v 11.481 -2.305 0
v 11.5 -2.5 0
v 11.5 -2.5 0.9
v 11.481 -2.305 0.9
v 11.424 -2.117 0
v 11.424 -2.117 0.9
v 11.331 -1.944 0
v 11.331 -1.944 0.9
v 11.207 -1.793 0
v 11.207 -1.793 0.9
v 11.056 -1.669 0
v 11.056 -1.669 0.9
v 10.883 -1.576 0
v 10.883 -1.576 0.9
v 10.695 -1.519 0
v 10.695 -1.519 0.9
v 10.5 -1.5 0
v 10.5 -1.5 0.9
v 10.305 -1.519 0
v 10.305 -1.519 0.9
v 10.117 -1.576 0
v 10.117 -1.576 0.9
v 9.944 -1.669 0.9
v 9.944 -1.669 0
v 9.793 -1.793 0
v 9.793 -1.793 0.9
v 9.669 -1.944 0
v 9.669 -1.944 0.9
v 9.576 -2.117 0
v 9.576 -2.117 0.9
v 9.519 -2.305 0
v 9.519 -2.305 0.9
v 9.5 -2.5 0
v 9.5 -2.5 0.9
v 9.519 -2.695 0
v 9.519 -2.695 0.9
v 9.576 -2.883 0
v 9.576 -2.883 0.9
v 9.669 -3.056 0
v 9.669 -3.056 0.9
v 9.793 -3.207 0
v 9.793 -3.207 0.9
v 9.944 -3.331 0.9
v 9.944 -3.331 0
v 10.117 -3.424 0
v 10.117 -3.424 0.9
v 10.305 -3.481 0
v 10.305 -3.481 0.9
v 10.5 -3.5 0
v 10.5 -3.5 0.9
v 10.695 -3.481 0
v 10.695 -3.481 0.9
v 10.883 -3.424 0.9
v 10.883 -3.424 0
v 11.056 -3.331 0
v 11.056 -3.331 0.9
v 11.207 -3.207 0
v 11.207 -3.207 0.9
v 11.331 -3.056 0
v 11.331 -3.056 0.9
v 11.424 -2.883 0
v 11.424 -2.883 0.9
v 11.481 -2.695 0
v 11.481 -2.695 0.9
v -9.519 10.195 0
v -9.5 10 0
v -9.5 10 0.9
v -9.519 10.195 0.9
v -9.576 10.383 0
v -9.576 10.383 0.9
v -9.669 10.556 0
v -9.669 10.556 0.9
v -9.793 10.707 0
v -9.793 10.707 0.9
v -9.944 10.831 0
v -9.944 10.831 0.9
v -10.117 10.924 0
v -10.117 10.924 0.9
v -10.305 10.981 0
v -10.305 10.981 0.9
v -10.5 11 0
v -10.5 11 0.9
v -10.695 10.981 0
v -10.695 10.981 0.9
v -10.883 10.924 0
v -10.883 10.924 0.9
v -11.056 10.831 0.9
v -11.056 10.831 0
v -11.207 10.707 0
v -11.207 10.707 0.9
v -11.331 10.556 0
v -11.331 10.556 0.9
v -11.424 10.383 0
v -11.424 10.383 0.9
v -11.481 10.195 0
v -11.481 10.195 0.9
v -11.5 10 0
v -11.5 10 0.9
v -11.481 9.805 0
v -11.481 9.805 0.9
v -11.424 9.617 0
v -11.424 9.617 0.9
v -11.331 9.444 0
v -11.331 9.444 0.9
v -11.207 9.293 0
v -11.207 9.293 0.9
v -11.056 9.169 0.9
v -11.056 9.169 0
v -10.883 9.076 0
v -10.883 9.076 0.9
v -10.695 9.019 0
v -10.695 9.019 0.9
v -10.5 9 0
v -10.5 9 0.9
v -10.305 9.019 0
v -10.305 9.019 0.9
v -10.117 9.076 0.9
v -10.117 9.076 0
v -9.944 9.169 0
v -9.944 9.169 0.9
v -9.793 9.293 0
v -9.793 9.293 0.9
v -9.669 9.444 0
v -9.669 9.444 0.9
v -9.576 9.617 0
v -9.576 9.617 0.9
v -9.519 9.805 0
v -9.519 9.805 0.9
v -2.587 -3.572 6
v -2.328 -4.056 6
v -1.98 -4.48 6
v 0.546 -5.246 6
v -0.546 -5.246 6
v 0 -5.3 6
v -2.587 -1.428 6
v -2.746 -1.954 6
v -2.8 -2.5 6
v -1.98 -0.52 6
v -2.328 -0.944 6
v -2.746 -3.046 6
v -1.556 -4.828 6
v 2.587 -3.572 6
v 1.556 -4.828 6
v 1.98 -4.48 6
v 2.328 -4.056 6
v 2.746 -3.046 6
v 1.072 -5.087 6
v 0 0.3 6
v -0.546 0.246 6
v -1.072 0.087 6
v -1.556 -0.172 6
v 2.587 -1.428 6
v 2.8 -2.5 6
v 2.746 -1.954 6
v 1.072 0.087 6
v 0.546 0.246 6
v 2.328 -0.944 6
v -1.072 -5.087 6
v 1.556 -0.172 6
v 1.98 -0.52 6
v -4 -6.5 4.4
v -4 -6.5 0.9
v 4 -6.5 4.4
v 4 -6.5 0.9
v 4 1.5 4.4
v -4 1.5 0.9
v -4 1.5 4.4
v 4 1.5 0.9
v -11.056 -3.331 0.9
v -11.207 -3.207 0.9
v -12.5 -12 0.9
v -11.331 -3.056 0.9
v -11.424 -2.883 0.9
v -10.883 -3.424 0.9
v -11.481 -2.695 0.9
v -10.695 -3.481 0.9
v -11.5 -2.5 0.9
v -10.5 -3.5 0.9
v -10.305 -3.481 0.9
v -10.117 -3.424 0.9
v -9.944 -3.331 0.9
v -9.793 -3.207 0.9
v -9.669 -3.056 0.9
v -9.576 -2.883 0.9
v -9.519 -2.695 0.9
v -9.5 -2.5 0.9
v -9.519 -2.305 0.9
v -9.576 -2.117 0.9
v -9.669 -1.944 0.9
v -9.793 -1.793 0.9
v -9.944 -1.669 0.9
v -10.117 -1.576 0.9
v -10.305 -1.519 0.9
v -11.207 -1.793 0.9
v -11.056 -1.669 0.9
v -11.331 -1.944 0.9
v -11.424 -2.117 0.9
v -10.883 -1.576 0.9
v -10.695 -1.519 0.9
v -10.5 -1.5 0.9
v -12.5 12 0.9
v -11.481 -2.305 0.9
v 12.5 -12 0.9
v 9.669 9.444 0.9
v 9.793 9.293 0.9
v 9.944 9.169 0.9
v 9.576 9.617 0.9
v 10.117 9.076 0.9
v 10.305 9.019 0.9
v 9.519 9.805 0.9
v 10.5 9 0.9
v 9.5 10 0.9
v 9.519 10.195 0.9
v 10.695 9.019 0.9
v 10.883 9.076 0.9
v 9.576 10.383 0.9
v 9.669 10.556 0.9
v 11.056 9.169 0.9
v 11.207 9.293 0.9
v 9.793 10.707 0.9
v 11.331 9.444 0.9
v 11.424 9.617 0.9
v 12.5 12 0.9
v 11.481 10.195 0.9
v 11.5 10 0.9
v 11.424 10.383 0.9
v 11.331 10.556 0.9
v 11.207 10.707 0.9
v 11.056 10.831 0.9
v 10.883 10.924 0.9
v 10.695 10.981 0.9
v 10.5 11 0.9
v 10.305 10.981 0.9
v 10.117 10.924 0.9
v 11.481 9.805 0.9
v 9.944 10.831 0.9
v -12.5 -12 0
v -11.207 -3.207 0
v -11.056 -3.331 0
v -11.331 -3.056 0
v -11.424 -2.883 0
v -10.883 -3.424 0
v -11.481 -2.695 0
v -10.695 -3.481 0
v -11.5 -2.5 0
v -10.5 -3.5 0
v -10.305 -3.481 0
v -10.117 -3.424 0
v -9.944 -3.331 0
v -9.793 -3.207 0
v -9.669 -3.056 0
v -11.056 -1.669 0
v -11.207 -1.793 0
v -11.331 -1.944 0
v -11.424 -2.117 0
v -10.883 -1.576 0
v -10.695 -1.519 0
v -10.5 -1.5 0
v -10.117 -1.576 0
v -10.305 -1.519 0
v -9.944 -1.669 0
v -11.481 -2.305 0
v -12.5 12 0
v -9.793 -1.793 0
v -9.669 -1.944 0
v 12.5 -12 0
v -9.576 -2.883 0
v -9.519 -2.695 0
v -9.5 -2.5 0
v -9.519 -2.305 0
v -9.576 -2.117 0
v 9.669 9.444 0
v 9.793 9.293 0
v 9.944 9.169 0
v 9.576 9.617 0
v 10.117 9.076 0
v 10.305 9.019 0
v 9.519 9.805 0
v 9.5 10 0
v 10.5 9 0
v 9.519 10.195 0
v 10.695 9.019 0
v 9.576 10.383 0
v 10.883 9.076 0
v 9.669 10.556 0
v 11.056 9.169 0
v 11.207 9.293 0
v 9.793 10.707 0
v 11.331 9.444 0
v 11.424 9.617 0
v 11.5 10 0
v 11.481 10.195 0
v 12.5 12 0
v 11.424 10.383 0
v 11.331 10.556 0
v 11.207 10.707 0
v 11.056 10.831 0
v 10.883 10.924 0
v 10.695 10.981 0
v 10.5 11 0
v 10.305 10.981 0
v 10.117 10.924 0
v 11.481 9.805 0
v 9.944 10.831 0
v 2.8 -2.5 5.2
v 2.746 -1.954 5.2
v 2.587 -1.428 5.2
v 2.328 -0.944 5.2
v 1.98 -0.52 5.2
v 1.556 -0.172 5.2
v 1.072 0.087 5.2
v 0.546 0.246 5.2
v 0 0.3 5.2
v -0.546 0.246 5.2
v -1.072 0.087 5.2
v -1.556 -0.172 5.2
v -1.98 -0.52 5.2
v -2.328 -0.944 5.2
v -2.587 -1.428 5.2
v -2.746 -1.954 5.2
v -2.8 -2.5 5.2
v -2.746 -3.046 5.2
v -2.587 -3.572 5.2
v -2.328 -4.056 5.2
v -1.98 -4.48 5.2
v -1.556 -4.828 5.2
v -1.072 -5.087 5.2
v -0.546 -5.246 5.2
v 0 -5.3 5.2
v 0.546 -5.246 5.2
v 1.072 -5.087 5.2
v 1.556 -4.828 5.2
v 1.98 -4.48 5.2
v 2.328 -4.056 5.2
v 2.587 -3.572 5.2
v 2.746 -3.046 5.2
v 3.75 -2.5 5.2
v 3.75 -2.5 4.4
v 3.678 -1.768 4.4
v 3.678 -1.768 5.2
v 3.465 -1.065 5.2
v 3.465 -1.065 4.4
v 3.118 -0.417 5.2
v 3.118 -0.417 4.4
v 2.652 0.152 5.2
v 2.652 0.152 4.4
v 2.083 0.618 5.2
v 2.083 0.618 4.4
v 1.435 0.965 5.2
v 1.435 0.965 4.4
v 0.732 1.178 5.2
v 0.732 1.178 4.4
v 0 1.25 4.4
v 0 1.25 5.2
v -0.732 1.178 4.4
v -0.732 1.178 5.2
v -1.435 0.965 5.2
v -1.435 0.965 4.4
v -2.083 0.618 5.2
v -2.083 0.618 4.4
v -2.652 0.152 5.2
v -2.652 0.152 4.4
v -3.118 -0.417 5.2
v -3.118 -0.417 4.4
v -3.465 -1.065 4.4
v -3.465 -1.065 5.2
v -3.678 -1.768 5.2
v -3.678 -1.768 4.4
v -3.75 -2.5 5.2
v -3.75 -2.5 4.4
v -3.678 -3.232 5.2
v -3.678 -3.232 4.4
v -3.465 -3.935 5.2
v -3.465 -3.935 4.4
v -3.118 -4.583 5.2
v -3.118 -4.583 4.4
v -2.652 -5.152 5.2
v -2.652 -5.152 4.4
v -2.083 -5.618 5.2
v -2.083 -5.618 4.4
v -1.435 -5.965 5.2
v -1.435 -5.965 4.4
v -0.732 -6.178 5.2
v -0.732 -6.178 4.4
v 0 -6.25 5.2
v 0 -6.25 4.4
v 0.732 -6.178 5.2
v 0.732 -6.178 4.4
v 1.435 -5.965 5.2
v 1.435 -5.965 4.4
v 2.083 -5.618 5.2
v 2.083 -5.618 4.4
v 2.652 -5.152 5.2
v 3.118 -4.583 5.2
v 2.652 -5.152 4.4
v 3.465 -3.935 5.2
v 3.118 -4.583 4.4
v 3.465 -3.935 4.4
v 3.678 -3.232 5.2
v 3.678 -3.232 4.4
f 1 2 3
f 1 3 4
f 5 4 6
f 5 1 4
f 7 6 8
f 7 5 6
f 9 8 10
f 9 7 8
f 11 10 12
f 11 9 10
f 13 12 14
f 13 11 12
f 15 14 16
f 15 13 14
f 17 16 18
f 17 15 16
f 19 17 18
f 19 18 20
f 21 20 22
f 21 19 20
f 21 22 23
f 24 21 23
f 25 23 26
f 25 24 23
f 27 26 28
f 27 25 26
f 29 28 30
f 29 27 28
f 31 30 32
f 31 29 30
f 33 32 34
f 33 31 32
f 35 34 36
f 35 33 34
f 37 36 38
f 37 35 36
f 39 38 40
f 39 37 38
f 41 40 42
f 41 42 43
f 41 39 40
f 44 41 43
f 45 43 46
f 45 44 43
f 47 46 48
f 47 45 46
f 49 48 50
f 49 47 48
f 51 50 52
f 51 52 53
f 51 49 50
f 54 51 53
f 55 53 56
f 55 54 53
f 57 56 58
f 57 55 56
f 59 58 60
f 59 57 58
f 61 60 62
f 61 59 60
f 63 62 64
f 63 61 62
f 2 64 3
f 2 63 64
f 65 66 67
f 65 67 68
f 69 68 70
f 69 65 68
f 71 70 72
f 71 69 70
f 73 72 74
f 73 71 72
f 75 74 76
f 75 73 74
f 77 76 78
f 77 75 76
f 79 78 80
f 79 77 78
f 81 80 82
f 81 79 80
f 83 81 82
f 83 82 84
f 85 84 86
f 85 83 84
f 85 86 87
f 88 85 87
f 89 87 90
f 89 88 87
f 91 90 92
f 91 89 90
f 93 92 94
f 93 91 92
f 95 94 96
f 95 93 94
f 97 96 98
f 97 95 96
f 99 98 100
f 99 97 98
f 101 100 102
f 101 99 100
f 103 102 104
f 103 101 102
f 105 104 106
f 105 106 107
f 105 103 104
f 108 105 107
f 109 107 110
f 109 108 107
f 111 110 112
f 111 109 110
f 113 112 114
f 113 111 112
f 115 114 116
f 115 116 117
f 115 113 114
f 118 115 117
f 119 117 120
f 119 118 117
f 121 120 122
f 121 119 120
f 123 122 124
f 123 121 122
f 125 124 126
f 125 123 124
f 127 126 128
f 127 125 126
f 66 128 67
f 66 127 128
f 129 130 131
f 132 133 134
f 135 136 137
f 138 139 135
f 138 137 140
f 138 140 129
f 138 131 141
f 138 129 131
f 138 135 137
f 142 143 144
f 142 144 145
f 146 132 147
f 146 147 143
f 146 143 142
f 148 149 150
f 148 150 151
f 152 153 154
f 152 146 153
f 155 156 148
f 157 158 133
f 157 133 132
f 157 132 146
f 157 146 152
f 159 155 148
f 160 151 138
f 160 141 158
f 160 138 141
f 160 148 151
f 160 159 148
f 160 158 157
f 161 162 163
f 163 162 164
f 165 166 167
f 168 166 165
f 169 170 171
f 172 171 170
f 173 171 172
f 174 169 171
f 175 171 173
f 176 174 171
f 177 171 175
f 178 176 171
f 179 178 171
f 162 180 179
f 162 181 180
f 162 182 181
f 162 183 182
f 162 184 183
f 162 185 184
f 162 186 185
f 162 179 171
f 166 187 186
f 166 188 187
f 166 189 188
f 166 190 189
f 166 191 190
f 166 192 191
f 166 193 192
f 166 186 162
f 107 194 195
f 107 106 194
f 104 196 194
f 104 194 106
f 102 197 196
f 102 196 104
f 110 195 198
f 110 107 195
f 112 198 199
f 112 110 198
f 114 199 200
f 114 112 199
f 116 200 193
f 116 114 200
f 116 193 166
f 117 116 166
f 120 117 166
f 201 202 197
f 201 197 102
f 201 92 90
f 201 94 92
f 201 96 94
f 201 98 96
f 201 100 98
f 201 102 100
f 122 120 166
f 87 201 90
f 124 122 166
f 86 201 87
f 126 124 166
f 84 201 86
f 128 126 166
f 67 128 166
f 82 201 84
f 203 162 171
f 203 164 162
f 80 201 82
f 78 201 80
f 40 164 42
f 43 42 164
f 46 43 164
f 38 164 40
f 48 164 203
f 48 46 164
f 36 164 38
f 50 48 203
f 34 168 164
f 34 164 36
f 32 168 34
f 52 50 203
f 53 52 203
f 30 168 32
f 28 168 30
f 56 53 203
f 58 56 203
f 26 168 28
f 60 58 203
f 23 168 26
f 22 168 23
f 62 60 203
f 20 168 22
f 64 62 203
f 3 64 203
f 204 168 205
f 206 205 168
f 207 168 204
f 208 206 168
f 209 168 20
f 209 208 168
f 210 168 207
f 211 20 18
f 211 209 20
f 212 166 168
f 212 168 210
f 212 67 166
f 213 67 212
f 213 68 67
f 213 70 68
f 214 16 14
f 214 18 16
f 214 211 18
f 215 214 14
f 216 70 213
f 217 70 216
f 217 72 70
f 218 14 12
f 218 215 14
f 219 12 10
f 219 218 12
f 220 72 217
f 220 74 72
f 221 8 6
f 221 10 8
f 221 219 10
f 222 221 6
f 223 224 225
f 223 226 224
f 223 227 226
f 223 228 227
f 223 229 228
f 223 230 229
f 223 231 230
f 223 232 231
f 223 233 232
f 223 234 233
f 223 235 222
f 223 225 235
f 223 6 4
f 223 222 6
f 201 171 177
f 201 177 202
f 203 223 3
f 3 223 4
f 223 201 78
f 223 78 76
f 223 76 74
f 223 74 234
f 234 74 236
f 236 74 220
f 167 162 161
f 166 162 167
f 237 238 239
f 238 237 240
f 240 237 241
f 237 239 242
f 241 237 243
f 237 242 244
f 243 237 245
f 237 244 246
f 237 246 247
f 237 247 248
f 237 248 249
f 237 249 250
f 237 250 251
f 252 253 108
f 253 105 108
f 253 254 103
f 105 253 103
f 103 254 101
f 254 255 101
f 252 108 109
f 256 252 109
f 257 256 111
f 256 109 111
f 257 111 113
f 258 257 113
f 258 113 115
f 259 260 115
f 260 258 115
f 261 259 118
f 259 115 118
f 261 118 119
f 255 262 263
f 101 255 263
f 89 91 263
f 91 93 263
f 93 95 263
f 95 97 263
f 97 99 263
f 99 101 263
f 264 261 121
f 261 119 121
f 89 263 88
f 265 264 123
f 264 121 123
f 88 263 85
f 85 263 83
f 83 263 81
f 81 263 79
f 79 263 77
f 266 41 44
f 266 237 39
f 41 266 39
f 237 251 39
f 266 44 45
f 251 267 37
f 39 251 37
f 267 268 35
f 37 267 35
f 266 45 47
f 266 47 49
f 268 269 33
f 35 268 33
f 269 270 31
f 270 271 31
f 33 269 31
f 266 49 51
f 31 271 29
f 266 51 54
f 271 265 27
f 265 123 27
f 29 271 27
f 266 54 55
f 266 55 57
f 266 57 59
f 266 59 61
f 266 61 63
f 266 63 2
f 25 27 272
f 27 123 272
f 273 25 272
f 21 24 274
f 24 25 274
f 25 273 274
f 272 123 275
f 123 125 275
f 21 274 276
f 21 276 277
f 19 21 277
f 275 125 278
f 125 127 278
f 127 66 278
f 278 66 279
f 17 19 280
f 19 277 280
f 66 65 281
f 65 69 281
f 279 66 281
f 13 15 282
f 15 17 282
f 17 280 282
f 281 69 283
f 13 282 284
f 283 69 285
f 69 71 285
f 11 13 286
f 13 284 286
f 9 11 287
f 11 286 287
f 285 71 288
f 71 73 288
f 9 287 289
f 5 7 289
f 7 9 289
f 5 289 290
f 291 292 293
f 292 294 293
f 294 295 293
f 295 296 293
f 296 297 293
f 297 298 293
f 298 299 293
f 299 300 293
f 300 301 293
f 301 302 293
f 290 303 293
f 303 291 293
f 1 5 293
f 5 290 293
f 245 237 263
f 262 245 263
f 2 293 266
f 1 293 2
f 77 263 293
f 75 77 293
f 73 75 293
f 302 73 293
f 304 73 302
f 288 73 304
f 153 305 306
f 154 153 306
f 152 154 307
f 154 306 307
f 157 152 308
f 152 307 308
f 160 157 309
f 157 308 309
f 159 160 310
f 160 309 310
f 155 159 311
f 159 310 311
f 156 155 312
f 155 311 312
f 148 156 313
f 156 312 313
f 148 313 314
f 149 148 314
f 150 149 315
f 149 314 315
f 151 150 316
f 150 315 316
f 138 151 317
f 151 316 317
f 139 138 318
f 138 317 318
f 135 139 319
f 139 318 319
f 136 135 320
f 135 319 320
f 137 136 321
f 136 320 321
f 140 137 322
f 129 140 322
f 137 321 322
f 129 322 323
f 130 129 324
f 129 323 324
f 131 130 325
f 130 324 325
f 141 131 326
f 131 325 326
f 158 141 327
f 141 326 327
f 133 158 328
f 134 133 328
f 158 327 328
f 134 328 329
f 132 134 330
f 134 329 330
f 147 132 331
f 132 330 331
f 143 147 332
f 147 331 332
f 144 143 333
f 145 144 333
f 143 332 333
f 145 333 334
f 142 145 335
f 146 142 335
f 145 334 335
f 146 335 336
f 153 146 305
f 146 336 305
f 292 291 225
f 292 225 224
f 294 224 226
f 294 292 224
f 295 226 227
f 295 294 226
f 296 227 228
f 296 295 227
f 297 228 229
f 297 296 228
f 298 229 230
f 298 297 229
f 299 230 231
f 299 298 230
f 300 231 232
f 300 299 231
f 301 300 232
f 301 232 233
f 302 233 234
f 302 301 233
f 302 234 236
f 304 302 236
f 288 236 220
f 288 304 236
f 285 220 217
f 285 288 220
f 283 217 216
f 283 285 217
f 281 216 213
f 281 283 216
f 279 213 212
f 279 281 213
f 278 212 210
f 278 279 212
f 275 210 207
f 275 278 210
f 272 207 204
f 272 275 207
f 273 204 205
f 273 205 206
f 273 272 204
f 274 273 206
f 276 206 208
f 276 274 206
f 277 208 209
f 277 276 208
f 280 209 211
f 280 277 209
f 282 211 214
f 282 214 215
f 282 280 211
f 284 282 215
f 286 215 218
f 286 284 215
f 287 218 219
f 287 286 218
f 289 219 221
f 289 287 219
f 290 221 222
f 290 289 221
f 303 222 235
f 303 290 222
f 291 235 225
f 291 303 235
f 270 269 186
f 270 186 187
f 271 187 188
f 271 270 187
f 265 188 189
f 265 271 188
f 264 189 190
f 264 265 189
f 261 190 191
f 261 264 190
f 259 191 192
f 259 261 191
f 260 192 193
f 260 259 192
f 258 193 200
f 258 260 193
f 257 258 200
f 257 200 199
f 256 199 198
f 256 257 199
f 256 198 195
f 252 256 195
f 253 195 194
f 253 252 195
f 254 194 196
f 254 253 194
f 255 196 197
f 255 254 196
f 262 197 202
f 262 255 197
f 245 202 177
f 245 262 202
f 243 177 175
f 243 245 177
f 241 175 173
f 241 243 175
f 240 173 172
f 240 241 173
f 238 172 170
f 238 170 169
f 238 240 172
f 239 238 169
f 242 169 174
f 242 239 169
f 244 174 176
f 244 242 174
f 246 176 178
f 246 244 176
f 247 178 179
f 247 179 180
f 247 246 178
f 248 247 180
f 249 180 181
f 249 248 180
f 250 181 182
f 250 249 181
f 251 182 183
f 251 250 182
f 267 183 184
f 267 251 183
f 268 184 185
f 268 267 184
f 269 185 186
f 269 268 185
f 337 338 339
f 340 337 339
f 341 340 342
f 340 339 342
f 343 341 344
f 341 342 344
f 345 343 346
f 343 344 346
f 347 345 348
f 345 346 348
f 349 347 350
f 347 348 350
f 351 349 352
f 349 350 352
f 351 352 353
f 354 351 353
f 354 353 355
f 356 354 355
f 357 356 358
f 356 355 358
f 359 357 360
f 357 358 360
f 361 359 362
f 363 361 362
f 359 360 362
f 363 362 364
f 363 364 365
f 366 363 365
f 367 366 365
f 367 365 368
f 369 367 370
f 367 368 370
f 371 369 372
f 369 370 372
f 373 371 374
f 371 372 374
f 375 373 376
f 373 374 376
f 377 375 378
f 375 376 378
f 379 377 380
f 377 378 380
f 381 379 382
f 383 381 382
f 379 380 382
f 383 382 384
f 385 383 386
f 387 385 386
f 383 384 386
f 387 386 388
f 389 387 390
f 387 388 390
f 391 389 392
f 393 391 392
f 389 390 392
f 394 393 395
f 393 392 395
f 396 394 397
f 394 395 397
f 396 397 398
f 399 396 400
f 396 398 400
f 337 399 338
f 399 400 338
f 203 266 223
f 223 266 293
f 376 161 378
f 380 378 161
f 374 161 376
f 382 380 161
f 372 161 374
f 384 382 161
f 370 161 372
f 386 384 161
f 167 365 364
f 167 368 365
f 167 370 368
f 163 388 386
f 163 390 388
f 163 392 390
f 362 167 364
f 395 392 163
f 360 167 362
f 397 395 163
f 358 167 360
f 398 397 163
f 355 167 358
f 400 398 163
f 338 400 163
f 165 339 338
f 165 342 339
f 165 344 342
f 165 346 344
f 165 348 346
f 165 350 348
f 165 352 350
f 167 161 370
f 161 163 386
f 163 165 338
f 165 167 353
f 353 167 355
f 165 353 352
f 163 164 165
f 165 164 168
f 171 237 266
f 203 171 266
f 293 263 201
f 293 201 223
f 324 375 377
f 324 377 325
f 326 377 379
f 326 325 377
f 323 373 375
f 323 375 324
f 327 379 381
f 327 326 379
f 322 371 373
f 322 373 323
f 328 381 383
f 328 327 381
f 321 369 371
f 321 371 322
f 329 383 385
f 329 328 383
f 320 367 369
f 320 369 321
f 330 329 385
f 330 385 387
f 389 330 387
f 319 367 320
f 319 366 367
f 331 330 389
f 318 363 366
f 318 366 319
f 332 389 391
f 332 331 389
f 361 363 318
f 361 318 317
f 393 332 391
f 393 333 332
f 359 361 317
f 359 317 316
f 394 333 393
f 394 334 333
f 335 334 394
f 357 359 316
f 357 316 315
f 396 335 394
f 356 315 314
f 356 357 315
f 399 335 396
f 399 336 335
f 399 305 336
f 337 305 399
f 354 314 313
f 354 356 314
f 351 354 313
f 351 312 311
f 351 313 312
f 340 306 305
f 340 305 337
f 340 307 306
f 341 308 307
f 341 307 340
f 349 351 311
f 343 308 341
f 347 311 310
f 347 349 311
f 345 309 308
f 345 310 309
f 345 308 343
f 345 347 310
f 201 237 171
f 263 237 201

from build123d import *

# Parameters (mm, degrees)
CROQUIS1_W              = 25
CROQUIS1_H              = 24
CROQUIS1_R              = 1
SALIENTE_EXTRUIR1_DEPTH = 0.9
CROQUIS2_W              = 8
CROQUIS2_H              = 8
SALIENTE_EXTRUIR2_DEPTH = 3.5
CROQUIS3_R              = 3.75
SALIENTE_EXTRUIR3_DEPTH = 0.8
CROQUIS4_R              = 2.8
SALIENTE_EXTRUIR4_DEPTH = 0.8


with BuildPart() as part:
    # Croquis1 → Saliente-Extruir1 (new body)
    with BuildSketch(Plane.XY):
        Rectangle(CROQUIS1_W, CROQUIS1_H)
        with Locations((10.5, 10)):
            Circle(CROQUIS1_R, mode=Mode.SUBTRACT)
        with Locations((10.5, -2.5)):
            Circle(CROQUIS1_R, mode=Mode.SUBTRACT)
        with Locations((-10.5, -2.5)):
            Circle(CROQUIS1_R, mode=Mode.SUBTRACT)
        with Locations((-10.5, 10)):
            Circle(CROQUIS1_R, mode=Mode.SUBTRACT)
    extrude(amount=SALIENTE_EXTRUIR1_DEPTH)

    # Croquis2 → Saliente-Extruir2 (add)
    with BuildSketch(Plane.XY.offset(0.9)):
        with Locations((0, -2.5)):
            Rectangle(CROQUIS2_W, CROQUIS2_H)
    extrude(amount=SALIENTE_EXTRUIR2_DEPTH)

    # Croquis3 → Saliente-Extruir3 (add)
    with BuildSketch(Plane.XY.offset(4.4)):
        with Locations((0, -2.5)):
            Circle(CROQUIS3_R)
    extrude(amount=SALIENTE_EXTRUIR3_DEPTH)

    # Croquis4 → Saliente-Extruir4 (add)
    with BuildSketch(Plane.XY.offset(5.2)):
        with Locations((0, -2.5)):
            Circle(CROQUIS4_R)
    extrude(amount=SALIENTE_EXTRUIR4_DEPTH)


solid = part.part
